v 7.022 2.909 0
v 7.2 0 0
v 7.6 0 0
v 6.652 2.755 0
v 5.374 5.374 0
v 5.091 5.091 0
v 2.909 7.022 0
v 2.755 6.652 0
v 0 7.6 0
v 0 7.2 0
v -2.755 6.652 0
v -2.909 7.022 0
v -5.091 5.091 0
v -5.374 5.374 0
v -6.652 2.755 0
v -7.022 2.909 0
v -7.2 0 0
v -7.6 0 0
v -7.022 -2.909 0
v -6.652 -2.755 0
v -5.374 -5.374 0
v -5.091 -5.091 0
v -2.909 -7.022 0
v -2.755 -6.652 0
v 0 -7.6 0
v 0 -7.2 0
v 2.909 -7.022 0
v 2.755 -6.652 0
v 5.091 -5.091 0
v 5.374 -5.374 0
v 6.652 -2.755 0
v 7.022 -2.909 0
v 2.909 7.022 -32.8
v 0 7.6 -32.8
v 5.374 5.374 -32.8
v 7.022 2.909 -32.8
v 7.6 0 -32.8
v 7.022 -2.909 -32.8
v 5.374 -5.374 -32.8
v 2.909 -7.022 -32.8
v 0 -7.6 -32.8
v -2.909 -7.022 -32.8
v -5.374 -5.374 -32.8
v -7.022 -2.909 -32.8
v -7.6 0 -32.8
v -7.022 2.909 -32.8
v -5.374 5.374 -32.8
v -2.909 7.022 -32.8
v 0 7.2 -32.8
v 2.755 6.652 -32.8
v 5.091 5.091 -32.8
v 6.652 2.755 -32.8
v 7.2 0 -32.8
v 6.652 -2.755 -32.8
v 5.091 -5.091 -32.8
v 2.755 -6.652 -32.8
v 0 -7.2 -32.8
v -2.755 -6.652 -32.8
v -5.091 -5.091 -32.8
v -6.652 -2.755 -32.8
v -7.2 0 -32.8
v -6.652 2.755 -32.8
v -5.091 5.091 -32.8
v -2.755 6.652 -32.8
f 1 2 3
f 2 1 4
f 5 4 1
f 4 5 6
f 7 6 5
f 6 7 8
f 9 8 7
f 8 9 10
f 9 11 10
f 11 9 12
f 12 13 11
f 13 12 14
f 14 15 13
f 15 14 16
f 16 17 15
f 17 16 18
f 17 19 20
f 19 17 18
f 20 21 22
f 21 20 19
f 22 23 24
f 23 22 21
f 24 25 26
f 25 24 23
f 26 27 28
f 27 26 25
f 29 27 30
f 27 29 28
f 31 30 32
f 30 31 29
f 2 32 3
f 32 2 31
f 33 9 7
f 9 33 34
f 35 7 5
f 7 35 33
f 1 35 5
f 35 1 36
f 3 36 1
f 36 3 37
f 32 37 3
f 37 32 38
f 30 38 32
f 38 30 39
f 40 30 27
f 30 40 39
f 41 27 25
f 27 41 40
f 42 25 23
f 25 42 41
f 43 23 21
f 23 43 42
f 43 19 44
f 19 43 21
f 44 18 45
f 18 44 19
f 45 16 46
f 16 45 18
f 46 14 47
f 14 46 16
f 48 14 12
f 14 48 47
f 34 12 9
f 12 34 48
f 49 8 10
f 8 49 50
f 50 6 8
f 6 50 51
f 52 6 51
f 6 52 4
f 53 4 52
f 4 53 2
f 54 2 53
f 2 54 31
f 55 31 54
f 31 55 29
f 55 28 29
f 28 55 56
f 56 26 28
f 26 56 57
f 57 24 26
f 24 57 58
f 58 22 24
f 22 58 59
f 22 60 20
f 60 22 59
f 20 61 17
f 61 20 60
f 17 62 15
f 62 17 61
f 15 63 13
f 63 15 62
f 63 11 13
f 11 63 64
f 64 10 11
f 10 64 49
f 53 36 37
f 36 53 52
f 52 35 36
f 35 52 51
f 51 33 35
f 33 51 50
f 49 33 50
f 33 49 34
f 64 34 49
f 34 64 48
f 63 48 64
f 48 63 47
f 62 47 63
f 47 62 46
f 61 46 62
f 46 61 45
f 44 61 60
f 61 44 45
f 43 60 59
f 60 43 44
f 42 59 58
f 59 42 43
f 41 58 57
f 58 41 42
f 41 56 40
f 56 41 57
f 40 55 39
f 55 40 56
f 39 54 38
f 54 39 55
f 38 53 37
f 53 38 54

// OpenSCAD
// file: ../p/4-4rin18.scad
use <../lib.scad>
function ldraw_lib__4_4rin18() = [
// 0 Ring 18 x 1.0
// 0 Name: 4-4rin18.dat
// 0 Author: Guy Vivan [guyvivan]
// 0 !LDRAW_ORG Primitive UPDATE 2009-03
// 0 !LICENSE Licensed under CC BY 2.0 and CC BY 4.0 : see CAreadme.txt
// 
// 0 BFC CERTIFY CCW
  [0,"BFC","CERTIFY"],
  [0,"BFC","CCW"],
// 
// 0 !HISTORY 2009-12-29 [PTadmin] Official Update 2009-03
// 
// 
// 4 16 18 0 0 19 0 0 17.5541 0 7.2713 16.6302 0 6.8886
  [4,16,18,0,0,19,0,0,17.5541,0,7.2713,16.6302,0,6.8886],
// 4 16 16.6302 0 6.8886 17.5541 0 7.2713 13.4349 0 13.4349 12.7278 0 12.7278
  [4,16,16.6302,0,6.8886,17.5541,0,7.2713,13.4349,0,13.4349,12.7278,0,12.7278],
// 4 16 12.7278 0 12.7278 13.4349 0 13.4349 7.2713 0 17.5541 6.8886 0 16.6302
  [4,16,12.7278,0,12.7278,13.4349,0,13.4349,7.2713,0,17.5541,6.8886,0,16.6302],
// 4 16 6.8886 0 16.6302 7.2713 0 17.5541 0 0 19 0 0 18
  [4,16,6.8886,0,16.6302,7.2713,0,17.5541,0,0,19,0,0,18],
// 4 16 0 0 18 0 0 19 -7.2713 0 17.5541 -6.8886 0 16.6302
  [4,16,0,0,18,0,0,19,-7.2713,0,17.5541,-6.8886,0,16.6302],
// 4 16 -6.8886 0 16.6302 -7.2713 0 17.5541 -13.4349 0 13.4349 -12.7278 0 12.7278
  [4,16,-6.8886,0,16.6302,-7.2713,0,17.5541,-13.4349,0,13.4349,-12.7278,0,12.7278],
// 4 16 -12.7278 0 12.7278 -13.4349 0 13.4349 -17.5541 0 7.2713 -16.6302 0 6.8886
  [4,16,-12.7278,0,12.7278,-13.4349,0,13.4349,-17.5541,0,7.2713,-16.6302,0,6.8886],
// 4 16 -16.6302 0 6.8886 -17.5541 0 7.2713 -19 0 0 -18 0 0
  [4,16,-16.6302,0,6.8886,-17.5541,0,7.2713,-19,0,0,-18,0,0],
// 4 16 -18 0 0 -19 0 0 -17.5541 0 -7.2713 -16.6302 0 -6.8886
  [4,16,-18,0,0,-19,0,0,-17.5541,0,-7.2713,-16.6302,0,-6.8886],
// 4 16 -16.6302 0 -6.8886 -17.5541 0 -7.2713 -13.4349 0 -13.4349 -12.7278 0 -12.7278
  [4,16,-16.6302,0,-6.8886,-17.5541,0,-7.2713,-13.4349,0,-13.4349,-12.7278,0,-12.7278],
// 4 16 -12.7278 0 -12.7278 -13.4349 0 -13.4349 -7.2713 0 -17.5541 -6.8886 0 -16.6302
  [4,16,-12.7278,0,-12.7278,-13.4349,0,-13.4349,-7.2713,0,-17.5541,-6.8886,0,-16.6302],
// 4 16 -6.8886 0 -16.6302 -7.2713 0 -17.5541 0 0 -19 0 0 -18
  [4,16,-6.8886,0,-16.6302,-7.2713,0,-17.5541,0,0,-19,0,0,-18],
// 4 16 0 0 -18 0 0 -19 7.2713 0 -17.5541 6.8886 0 -16.6302
  [4,16,0,0,-18,0,0,-19,7.2713,0,-17.5541,6.8886,0,-16.6302],
// 4 16 6.8886 0 -16.6302 7.2713 0 -17.5541 13.4349 0 -13.4349 12.7278 0 -12.7278
  [4,16,6.8886,0,-16.6302,7.2713,0,-17.5541,13.4349,0,-13.4349,12.7278,0,-12.7278],
// 4 16 12.7278 0 -12.7278 13.4349 0 -13.4349 17.5541 0 -7.2713 16.6302 0 -6.8886
  [4,16,12.7278,0,-12.7278,13.4349,0,-13.4349,17.5541,0,-7.2713,16.6302,0,-6.8886],
// 4 16 16.6302 0 -6.8886 17.5541 0 -7.2713 19 0 0 18 0 0
  [4,16,16.6302,0,-6.8886,17.5541,0,-7.2713,19,0,0,18,0,0],
// 
// 0 end of file
// 
];
module ldraw_lib__4_4rin18(step=0, col=false, unit=2/5, alt=false, line=0.2, solid=!$preview)
    makepoly(ldraw_lib__4_4rin18(), step=step, col=col, unit=unit, alt=alt, line=line, solid=solid);
ldraw_lib__4_4rin18(line=0.2);
// file: ../p/4-4edge.scad
use <../lib.scad>
function ldraw_lib__4_4edge() = [
// 0 Circle 1.0
// 0 Name: 4-4edge.dat
// 0 Author: James Jessiman
// 0 !LDRAW_ORG Primitive UPDATE 2017-01
// 0 !LICENSE Licensed under CC BY 4.0 : see CAreadme.txt
// 
// 0 BFC CERTIFY CCW
  [0,"BFC","CERTIFY"],
  [0,"BFC","CCW"],
// 
// 0 !HISTORY 1998-12-15 [PTadmin] Official Update 1998-10
// 0 !HISTORY 2005-12-28 [PTadmin] Official Update 2005-01
// 0 !HISTORY 2007-06-24 [PTadmin] Header formatted for Contributor Agreement
// 0 !HISTORY 2008-07-01 [PTadmin] Official Update 2008-01
// 0 !HISTORY 2017-01-15 [Steffen] BFCed
// 0 !HISTORY 2017-12-30 [PTadmin] Official Update 2017-01
// 
// 
// 2 24 1 0 0 0.9239 0 0.3827
  [2,24,1,0,0,0.9239,0,0.3827],
// 2 24 0.9239 0 0.3827 0.7071 0 0.7071
  [2,24,0.9239,0,0.3827,0.7071,0,0.7071],
// 2 24 0.7071 0 0.7071 0.3827 0 0.9239
  [2,24,0.7071,0,0.7071,0.3827,0,0.9239],
// 2 24 0.3827 0 0.9239 0 0 1
  [2,24,0.3827,0,0.9239,0,0,1],
// 2 24 0 0 1 -0.3827 0 0.9239
  [2,24,0,0,1,-0.3827,0,0.9239],
// 2 24 -0.3827 0 0.9239 -0.7071 0 0.7071
  [2,24,-0.3827,0,0.9239,-0.7071,0,0.7071],
// 2 24 -0.7071 0 0.7071 -0.9239 0 0.3827
  [2,24,-0.7071,0,0.7071,-0.9239,0,0.3827],
// 2 24 -0.9239 0 0.3827 -1 0 -0
  [2,24,-0.9239,0,0.3827,-1,0,-0],
// 2 24 -1 0 -0 -0.9239 0 -0.3827
  [2,24,-1,0,-0,-0.9239,0,-0.3827],
// 2 24 -0.9239 0 -0.3827 -0.7071 0 -0.7071
  [2,24,-0.9239,0,-0.3827,-0.7071,0,-0.7071],
// 2 24 -0.7071 0 -0.7071 -0.3827 0 -0.9239
  [2,24,-0.7071,0,-0.7071,-0.3827,0,-0.9239],
// 2 24 -0.3827 0 -0.9239 0 0 -1
  [2,24,-0.3827,0,-0.9239,0,0,-1],
// 2 24 0 0 -1 0.3827 0 -0.9239
  [2,24,0,0,-1,0.3827,0,-0.9239],
// 2 24 0.3827 0 -0.9239 0.7071 0 -0.7071
  [2,24,0.3827,0,-0.9239,0.7071,0,-0.7071],
// 2 24 0.7071 0 -0.7071 0.9239 0 -0.3827
  [2,24,0.7071,0,-0.7071,0.9239,0,-0.3827],
// 2 24 0.9239 0 -0.3827 1 0 0
  [2,24,0.9239,0,-0.3827,1,0,0],
];
module ldraw_lib__4_4edge(step=0, col=false, unit=2/5, alt=false, line=0.2, solid=!$preview)
    makepoly(ldraw_lib__4_4edge(), step=step, col=col, unit=unit, alt=alt, line=line, solid=solid);
ldraw_lib__4_4edge(line=0.2);
// file: ../p/4-4cyli.scad
use <../lib.scad>
function ldraw_lib__4_4cyli() = [
// 0 Cylinder 1.0
// 0 Name: 4-4cyli.dat
// 0 Author: James Jessiman
// 0 !LDRAW_ORG Primitive UPDATE 2005-01
// 0 !LICENSE Licensed under CC BY 4.0 : see CAreadme.txt
// 
// 0 BFC CERTIFY CCW
  [0,"BFC","CERTIFY"],
  [0,"BFC","CCW"],
// 
// 0 !HISTORY 1998-12-15 [PTadmin] Official Update 1998-10
// 0 !HISTORY 2002-03-23 [sbliss] Added BFC statement; merged headers from files in distributions LDraw 0.27 and Complete.
// 0 !HISTORY 2002-04-25 [PTadmin] Official Update 2002-02
// 0 !HISTORY 2004-12-14 [guyvivan] BFC CCW
// 0 !HISTORY 2005-12-28 [PTadmin] Official Update 2005-01
// 0 !HISTORY 2007-06-24 [PTadmin] Header formatted for Contributor Agreement
// 0 !HISTORY 2008-07-01 [PTadmin] Official Update 2008-01
// 
// 
// 4 16 1 1 0 0.9239 1 0.3827 0.9239 0 0.3827 1 0 0
  [4,16,1,1,0,0.9239,1,0.3827,0.9239,0,0.3827,1,0,0],
// 5 24 1 0 0 1 1 0 0.9239 0 0.3827 0.9239 0 -0.3827
  [5,24,1,0,0,1,1,0,0.9239,0,0.3827,0.9239,0,-0.3827],
// 4 16 0.9239 1 0.3827 0.7071 1 0.7071 0.7071 0 0.7071 0.9239 0 0.3827
  [4,16,0.9239,1,0.3827,0.7071,1,0.7071,0.7071,0,0.7071,0.9239,0,0.3827],
// 5 24 0.9239 0 0.3827 0.9239 1 0.3827 0.7071 0 0.7071 1 0 0
  [5,24,0.9239,0,0.3827,0.9239,1,0.3827,0.7071,0,0.7071,1,0,0],
// 4 16 0.7071 1 0.7071 0.3827 1 0.9239 0.3827 0 0.9239 0.7071 0 0.7071
  [4,16,0.7071,1,0.7071,0.3827,1,0.9239,0.3827,0,0.9239,0.7071,0,0.7071],
// 5 24 0.7071 0 0.7071 0.7071 1 0.7071 0.3827 0 0.9239 0.9239 0 0.3827
  [5,24,0.7071,0,0.7071,0.7071,1,0.7071,0.3827,0,0.9239,0.9239,0,0.3827],
// 4 16 0.3827 1 0.9239 0 1 1 0 0 1 0.3827 0 0.9239
  [4,16,0.3827,1,0.9239,0,1,1,0,0,1,0.3827,0,0.9239],
// 5 24 0.3827 0 0.9239 0.3827 1 0.9239 0 0 1 0.7071 0 0.7071
  [5,24,0.3827,0,0.9239,0.3827,1,0.9239,0,0,1,0.7071,0,0.7071],
// 4 16 0 1 1 -0.3827 1 0.9239 -0.3827 0 0.9239 0 0 1
  [4,16,0,1,1,-0.3827,1,0.9239,-0.3827,0,0.9239,0,0,1],
// 5 24 0 0 1 0 1 1 -0.3827 0 0.9239 0.3827 0 0.9239
  [5,24,0,0,1,0,1,1,-0.3827,0,0.9239,0.3827,0,0.9239],
// 4 16 -0.3827 1 0.9239 -0.7071 1 0.7071 -0.7071 0 0.7071 -0.3827 0 0.9239
  [4,16,-0.3827,1,0.9239,-0.7071,1,0.7071,-0.7071,0,0.7071,-0.3827,0,0.9239],
// 5 24 -0.3827 0 0.9239 -0.3827 1 0.9239 -0.7071 0 0.7071 0 0 1
  [5,24,-0.3827,0,0.9239,-0.3827,1,0.9239,-0.7071,0,0.7071,0,0,1],
// 4 16 -0.7071 1 0.7071 -0.9239 1 0.3827 -0.9239 0 0.3827 -0.7071 0 0.7071
  [4,16,-0.7071,1,0.7071,-0.9239,1,0.3827,-0.9239,0,0.3827,-0.7071,0,0.7071],
// 5 24 -0.7071 0 0.7071 -0.7071 1 0.7071 -0.9239 0 0.3827 -0.3827 0 0.9239
  [5,24,-0.7071,0,0.7071,-0.7071,1,0.7071,-0.9239,0,0.3827,-0.3827,0,0.9239],
// 4 16 -0.9239 1 0.3827 -1 1 0 -1 0 0 -0.9239 0 0.3827
  [4,16,-0.9239,1,0.3827,-1,1,0,-1,0,0,-0.9239,0,0.3827],
// 5 24 -0.9239 0 0.3827 -0.9239 1 0.3827 -1 0 0 -0.7071 0 0.7071
  [5,24,-0.9239,0,0.3827,-0.9239,1,0.3827,-1,0,0,-0.7071,0,0.7071],
// 4 16 -1 1 0 -0.9239 1 -0.3827 -0.9239 0 -0.3827 -1 0 0
  [4,16,-1,1,0,-0.9239,1,-0.3827,-0.9239,0,-0.3827,-1,0,0],
// 5 24 -1 0 0 -1 1 0 -0.9239 0 -0.3827 -0.9239 0 0.3827
  [5,24,-1,0,0,-1,1,0,-0.9239,0,-0.3827,-0.9239,0,0.3827],
// 4 16 -0.9239 1 -0.3827 -0.7071 1 -0.7071 -0.7071 0 -0.7071 -0.9239 0 -0.3827
  [4,16,-0.9239,1,-0.3827,-0.7071,1,-0.7071,-0.7071,0,-0.7071,-0.9239,0,-0.3827],
// 5 24 -0.9239 0 -0.3827 -0.9239 1 -0.3827 -0.7071 0 -0.7071 -1 0 0
  [5,24,-0.9239,0,-0.3827,-0.9239,1,-0.3827,-0.7071,0,-0.7071,-1,0,0],
// 4 16 -0.7071 1 -0.7071 -0.3827 1 -0.9239 -0.3827 0 -0.9239 -0.7071 0 -0.7071
  [4,16,-0.7071,1,-0.7071,-0.3827,1,-0.9239,-0.3827,0,-0.9239,-0.7071,0,-0.7071],
// 5 24 -0.7071 0 -0.7071 -0.7071 1 -0.7071 -0.3827 0 -0.9239 -0.9239 0 -0.3827
  [5,24,-0.7071,0,-0.7071,-0.7071,1,-0.7071,-0.3827,0,-0.9239,-0.9239,0,-0.3827],
// 4 16 -0.3827 1 -0.9239 0 1 -1 0 0 -1 -0.3827 0 -0.9239
  [4,16,-0.3827,1,-0.9239,0,1,-1,0,0,-1,-0.3827,0,-0.9239],
// 5 24 -0.3827 0 -0.9239 -0.3827 1 -0.9239 0 0 -1 -0.7071 0 -0.7071
  [5,24,-0.3827,0,-0.9239,-0.3827,1,-0.9239,0,0,-1,-0.7071,0,-0.7071],
// 4 16 0 1 -1 0.3827 1 -0.9239 0.3827 0 -0.9239 0 0 -1
  [4,16,0,1,-1,0.3827,1,-0.9239,0.3827,0,-0.9239,0,0,-1],
// 5 24 0 0 -1 0 1 -1 0.3827 0 -0.9239 -0.3827 0 -0.9239
  [5,24,0,0,-1,0,1,-1,0.3827,0,-0.9239,-0.3827,0,-0.9239],
// 4 16 0.3827 1 -0.9239 0.7071 1 -0.7071 0.7071 0 -0.7071 0.3827 0 -0.9239
  [4,16,0.3827,1,-0.9239,0.7071,1,-0.7071,0.7071,0,-0.7071,0.3827,0,-0.9239],
// 5 24 0.3827 0 -0.9239 0.3827 1 -0.9239 0.7071 0 -0.7071 0 0 -1
  [5,24,0.3827,0,-0.9239,0.3827,1,-0.9239,0.7071,0,-0.7071,0,0,-1],
// 4 16 0.7071 1 -0.7071 0.9239 1 -0.3827 0.9239 0 -0.3827 0.7071 0 -0.7071
  [4,16,0.7071,1,-0.7071,0.9239,1,-0.3827,0.9239,0,-0.3827,0.7071,0,-0.7071],
// 5 24 0.7071 0 -0.7071 0.7071 1 -0.7071 0.9239 0 -0.3827 0.3827 0 -0.9239
  [5,24,0.7071,0,-0.7071,0.7071,1,-0.7071,0.9239,0,-0.3827,0.3827,0,-0.9239],
// 4 16 0.9239 1 -0.3827 1 1 0 1 0 0 0.9239 0 -0.3827
  [4,16,0.9239,1,-0.3827,1,1,0,1,0,0,0.9239,0,-0.3827],
// 5 24 0.9239 0 -0.3827 0.9239 1 -0.3827 1 0 0 0.7071 0 -0.7071
  [5,24,0.9239,0,-0.3827,0.9239,1,-0.3827,1,0,0,0.7071,0,-0.7071],
// 0
];
module ldraw_lib__4_4cyli(step=0, col=false, unit=2/5, alt=false, line=0.2, solid=!$preview)
    makepoly(ldraw_lib__4_4cyli(), step=step, col=col, unit=unit, alt=alt, line=line, solid=solid);
ldraw_lib__4_4cyli(line=0.2);
// main file
use <../lib.scad>
use <../p/4-4cyli.scad>
use <../p/4-4edge.scad>
use <../p/4-4rin18.scad>
function ldraw_lib__127() = [
// 0 ~Technic Pneumatic Cylinder 2 x 2 x 3.5
// 0 Name: 127.dat
// 0 Author: Marc Klein [marckl]
// 0 !LDRAW_ORG Part UPDATE 2009-03
// 0 !LICENSE Licensed under CC BY 4.0 : see CAreadme.txt
// 
// 0 BFC CERTIFY CCW
  [0,"BFC","CERTIFY"],
  [0,"BFC","CCW"],
// 
// 0 !HISTORY 2006-08-20 [WilliamH] sub-parted
// 0 !HISTORY 2009-12-18 [cwdee] Reworked to comprise cylinder alone
// 0 !HISTORY 2009-12-29 [PTadmin] Official Update 2009-03
// 
// 
// 0 // Needs work: missing internal detail
// 
// 1 16 0 0 0 0 0 18 0 -1 0 18 0 0 4-4edge.dat
  [1,16,0,0,0,0,0,18,0,-1,0,18,0,0, ldraw_lib__4_4edge()],
// 1 16 0 0 0 1 0 0 0 1 0 0 0 1 4-4rin18.dat
  [1,16,0,0,0,1,0,0,0,1,0,0,0,1, ldraw_lib__4_4rin18()],
// 1 16 0 0 0 0 0 19 0 -1 0 19 0 0 4-4edge.dat
  [1,16,0,0,0,0,0,19,0,-1,0,19,0,0, ldraw_lib__4_4edge()],
// 1 16 0 82 0 0 0 19 0 -82 0 19 0 0 4-4cyli.dat
  [1,16,0,82,0,0,0,19,0,-82,0,19,0,0, ldraw_lib__4_4cyli()],
// 0 BFC INVERTNEXT
  [0,"BFC","INVERTNEXT"],
// 1 16 0 82 0 0 0 18 0 -82 0 18 0 0 4-4cyli.dat
  [1,16,0,82,0,0,0,18,0,-82,0,18,0,0, ldraw_lib__4_4cyli()],
// 1 16 0 82 0 0 0 18 0 -1 0 18 0 0 4-4edge.dat
  [1,16,0,82,0,0,0,18,0,-1,0,18,0,0, ldraw_lib__4_4edge()],
// 1 16 0 82 0 1 0 0 0 -1 0 0 0 1 4-4rin18.dat
  [1,16,0,82,0,1,0,0,0,-1,0,0,0,1, ldraw_lib__4_4rin18()],
// 1 16 0 82 0 0 0 19 0 -1 0 19 0 0 4-4edge.dat
  [1,16,0,82,0,0,0,19,0,-1,0,19,0,0, ldraw_lib__4_4edge()],
// 0
];
module ldraw_lib__127(step=0, col=false, unit=2/5, alt=false, line=0.2, solid=!$preview)
    makepoly(ldraw_lib__127(), step=step, col=col, unit=unit, alt=alt, line=line, solid=solid);
ldraw_lib__127(line=0.2);
